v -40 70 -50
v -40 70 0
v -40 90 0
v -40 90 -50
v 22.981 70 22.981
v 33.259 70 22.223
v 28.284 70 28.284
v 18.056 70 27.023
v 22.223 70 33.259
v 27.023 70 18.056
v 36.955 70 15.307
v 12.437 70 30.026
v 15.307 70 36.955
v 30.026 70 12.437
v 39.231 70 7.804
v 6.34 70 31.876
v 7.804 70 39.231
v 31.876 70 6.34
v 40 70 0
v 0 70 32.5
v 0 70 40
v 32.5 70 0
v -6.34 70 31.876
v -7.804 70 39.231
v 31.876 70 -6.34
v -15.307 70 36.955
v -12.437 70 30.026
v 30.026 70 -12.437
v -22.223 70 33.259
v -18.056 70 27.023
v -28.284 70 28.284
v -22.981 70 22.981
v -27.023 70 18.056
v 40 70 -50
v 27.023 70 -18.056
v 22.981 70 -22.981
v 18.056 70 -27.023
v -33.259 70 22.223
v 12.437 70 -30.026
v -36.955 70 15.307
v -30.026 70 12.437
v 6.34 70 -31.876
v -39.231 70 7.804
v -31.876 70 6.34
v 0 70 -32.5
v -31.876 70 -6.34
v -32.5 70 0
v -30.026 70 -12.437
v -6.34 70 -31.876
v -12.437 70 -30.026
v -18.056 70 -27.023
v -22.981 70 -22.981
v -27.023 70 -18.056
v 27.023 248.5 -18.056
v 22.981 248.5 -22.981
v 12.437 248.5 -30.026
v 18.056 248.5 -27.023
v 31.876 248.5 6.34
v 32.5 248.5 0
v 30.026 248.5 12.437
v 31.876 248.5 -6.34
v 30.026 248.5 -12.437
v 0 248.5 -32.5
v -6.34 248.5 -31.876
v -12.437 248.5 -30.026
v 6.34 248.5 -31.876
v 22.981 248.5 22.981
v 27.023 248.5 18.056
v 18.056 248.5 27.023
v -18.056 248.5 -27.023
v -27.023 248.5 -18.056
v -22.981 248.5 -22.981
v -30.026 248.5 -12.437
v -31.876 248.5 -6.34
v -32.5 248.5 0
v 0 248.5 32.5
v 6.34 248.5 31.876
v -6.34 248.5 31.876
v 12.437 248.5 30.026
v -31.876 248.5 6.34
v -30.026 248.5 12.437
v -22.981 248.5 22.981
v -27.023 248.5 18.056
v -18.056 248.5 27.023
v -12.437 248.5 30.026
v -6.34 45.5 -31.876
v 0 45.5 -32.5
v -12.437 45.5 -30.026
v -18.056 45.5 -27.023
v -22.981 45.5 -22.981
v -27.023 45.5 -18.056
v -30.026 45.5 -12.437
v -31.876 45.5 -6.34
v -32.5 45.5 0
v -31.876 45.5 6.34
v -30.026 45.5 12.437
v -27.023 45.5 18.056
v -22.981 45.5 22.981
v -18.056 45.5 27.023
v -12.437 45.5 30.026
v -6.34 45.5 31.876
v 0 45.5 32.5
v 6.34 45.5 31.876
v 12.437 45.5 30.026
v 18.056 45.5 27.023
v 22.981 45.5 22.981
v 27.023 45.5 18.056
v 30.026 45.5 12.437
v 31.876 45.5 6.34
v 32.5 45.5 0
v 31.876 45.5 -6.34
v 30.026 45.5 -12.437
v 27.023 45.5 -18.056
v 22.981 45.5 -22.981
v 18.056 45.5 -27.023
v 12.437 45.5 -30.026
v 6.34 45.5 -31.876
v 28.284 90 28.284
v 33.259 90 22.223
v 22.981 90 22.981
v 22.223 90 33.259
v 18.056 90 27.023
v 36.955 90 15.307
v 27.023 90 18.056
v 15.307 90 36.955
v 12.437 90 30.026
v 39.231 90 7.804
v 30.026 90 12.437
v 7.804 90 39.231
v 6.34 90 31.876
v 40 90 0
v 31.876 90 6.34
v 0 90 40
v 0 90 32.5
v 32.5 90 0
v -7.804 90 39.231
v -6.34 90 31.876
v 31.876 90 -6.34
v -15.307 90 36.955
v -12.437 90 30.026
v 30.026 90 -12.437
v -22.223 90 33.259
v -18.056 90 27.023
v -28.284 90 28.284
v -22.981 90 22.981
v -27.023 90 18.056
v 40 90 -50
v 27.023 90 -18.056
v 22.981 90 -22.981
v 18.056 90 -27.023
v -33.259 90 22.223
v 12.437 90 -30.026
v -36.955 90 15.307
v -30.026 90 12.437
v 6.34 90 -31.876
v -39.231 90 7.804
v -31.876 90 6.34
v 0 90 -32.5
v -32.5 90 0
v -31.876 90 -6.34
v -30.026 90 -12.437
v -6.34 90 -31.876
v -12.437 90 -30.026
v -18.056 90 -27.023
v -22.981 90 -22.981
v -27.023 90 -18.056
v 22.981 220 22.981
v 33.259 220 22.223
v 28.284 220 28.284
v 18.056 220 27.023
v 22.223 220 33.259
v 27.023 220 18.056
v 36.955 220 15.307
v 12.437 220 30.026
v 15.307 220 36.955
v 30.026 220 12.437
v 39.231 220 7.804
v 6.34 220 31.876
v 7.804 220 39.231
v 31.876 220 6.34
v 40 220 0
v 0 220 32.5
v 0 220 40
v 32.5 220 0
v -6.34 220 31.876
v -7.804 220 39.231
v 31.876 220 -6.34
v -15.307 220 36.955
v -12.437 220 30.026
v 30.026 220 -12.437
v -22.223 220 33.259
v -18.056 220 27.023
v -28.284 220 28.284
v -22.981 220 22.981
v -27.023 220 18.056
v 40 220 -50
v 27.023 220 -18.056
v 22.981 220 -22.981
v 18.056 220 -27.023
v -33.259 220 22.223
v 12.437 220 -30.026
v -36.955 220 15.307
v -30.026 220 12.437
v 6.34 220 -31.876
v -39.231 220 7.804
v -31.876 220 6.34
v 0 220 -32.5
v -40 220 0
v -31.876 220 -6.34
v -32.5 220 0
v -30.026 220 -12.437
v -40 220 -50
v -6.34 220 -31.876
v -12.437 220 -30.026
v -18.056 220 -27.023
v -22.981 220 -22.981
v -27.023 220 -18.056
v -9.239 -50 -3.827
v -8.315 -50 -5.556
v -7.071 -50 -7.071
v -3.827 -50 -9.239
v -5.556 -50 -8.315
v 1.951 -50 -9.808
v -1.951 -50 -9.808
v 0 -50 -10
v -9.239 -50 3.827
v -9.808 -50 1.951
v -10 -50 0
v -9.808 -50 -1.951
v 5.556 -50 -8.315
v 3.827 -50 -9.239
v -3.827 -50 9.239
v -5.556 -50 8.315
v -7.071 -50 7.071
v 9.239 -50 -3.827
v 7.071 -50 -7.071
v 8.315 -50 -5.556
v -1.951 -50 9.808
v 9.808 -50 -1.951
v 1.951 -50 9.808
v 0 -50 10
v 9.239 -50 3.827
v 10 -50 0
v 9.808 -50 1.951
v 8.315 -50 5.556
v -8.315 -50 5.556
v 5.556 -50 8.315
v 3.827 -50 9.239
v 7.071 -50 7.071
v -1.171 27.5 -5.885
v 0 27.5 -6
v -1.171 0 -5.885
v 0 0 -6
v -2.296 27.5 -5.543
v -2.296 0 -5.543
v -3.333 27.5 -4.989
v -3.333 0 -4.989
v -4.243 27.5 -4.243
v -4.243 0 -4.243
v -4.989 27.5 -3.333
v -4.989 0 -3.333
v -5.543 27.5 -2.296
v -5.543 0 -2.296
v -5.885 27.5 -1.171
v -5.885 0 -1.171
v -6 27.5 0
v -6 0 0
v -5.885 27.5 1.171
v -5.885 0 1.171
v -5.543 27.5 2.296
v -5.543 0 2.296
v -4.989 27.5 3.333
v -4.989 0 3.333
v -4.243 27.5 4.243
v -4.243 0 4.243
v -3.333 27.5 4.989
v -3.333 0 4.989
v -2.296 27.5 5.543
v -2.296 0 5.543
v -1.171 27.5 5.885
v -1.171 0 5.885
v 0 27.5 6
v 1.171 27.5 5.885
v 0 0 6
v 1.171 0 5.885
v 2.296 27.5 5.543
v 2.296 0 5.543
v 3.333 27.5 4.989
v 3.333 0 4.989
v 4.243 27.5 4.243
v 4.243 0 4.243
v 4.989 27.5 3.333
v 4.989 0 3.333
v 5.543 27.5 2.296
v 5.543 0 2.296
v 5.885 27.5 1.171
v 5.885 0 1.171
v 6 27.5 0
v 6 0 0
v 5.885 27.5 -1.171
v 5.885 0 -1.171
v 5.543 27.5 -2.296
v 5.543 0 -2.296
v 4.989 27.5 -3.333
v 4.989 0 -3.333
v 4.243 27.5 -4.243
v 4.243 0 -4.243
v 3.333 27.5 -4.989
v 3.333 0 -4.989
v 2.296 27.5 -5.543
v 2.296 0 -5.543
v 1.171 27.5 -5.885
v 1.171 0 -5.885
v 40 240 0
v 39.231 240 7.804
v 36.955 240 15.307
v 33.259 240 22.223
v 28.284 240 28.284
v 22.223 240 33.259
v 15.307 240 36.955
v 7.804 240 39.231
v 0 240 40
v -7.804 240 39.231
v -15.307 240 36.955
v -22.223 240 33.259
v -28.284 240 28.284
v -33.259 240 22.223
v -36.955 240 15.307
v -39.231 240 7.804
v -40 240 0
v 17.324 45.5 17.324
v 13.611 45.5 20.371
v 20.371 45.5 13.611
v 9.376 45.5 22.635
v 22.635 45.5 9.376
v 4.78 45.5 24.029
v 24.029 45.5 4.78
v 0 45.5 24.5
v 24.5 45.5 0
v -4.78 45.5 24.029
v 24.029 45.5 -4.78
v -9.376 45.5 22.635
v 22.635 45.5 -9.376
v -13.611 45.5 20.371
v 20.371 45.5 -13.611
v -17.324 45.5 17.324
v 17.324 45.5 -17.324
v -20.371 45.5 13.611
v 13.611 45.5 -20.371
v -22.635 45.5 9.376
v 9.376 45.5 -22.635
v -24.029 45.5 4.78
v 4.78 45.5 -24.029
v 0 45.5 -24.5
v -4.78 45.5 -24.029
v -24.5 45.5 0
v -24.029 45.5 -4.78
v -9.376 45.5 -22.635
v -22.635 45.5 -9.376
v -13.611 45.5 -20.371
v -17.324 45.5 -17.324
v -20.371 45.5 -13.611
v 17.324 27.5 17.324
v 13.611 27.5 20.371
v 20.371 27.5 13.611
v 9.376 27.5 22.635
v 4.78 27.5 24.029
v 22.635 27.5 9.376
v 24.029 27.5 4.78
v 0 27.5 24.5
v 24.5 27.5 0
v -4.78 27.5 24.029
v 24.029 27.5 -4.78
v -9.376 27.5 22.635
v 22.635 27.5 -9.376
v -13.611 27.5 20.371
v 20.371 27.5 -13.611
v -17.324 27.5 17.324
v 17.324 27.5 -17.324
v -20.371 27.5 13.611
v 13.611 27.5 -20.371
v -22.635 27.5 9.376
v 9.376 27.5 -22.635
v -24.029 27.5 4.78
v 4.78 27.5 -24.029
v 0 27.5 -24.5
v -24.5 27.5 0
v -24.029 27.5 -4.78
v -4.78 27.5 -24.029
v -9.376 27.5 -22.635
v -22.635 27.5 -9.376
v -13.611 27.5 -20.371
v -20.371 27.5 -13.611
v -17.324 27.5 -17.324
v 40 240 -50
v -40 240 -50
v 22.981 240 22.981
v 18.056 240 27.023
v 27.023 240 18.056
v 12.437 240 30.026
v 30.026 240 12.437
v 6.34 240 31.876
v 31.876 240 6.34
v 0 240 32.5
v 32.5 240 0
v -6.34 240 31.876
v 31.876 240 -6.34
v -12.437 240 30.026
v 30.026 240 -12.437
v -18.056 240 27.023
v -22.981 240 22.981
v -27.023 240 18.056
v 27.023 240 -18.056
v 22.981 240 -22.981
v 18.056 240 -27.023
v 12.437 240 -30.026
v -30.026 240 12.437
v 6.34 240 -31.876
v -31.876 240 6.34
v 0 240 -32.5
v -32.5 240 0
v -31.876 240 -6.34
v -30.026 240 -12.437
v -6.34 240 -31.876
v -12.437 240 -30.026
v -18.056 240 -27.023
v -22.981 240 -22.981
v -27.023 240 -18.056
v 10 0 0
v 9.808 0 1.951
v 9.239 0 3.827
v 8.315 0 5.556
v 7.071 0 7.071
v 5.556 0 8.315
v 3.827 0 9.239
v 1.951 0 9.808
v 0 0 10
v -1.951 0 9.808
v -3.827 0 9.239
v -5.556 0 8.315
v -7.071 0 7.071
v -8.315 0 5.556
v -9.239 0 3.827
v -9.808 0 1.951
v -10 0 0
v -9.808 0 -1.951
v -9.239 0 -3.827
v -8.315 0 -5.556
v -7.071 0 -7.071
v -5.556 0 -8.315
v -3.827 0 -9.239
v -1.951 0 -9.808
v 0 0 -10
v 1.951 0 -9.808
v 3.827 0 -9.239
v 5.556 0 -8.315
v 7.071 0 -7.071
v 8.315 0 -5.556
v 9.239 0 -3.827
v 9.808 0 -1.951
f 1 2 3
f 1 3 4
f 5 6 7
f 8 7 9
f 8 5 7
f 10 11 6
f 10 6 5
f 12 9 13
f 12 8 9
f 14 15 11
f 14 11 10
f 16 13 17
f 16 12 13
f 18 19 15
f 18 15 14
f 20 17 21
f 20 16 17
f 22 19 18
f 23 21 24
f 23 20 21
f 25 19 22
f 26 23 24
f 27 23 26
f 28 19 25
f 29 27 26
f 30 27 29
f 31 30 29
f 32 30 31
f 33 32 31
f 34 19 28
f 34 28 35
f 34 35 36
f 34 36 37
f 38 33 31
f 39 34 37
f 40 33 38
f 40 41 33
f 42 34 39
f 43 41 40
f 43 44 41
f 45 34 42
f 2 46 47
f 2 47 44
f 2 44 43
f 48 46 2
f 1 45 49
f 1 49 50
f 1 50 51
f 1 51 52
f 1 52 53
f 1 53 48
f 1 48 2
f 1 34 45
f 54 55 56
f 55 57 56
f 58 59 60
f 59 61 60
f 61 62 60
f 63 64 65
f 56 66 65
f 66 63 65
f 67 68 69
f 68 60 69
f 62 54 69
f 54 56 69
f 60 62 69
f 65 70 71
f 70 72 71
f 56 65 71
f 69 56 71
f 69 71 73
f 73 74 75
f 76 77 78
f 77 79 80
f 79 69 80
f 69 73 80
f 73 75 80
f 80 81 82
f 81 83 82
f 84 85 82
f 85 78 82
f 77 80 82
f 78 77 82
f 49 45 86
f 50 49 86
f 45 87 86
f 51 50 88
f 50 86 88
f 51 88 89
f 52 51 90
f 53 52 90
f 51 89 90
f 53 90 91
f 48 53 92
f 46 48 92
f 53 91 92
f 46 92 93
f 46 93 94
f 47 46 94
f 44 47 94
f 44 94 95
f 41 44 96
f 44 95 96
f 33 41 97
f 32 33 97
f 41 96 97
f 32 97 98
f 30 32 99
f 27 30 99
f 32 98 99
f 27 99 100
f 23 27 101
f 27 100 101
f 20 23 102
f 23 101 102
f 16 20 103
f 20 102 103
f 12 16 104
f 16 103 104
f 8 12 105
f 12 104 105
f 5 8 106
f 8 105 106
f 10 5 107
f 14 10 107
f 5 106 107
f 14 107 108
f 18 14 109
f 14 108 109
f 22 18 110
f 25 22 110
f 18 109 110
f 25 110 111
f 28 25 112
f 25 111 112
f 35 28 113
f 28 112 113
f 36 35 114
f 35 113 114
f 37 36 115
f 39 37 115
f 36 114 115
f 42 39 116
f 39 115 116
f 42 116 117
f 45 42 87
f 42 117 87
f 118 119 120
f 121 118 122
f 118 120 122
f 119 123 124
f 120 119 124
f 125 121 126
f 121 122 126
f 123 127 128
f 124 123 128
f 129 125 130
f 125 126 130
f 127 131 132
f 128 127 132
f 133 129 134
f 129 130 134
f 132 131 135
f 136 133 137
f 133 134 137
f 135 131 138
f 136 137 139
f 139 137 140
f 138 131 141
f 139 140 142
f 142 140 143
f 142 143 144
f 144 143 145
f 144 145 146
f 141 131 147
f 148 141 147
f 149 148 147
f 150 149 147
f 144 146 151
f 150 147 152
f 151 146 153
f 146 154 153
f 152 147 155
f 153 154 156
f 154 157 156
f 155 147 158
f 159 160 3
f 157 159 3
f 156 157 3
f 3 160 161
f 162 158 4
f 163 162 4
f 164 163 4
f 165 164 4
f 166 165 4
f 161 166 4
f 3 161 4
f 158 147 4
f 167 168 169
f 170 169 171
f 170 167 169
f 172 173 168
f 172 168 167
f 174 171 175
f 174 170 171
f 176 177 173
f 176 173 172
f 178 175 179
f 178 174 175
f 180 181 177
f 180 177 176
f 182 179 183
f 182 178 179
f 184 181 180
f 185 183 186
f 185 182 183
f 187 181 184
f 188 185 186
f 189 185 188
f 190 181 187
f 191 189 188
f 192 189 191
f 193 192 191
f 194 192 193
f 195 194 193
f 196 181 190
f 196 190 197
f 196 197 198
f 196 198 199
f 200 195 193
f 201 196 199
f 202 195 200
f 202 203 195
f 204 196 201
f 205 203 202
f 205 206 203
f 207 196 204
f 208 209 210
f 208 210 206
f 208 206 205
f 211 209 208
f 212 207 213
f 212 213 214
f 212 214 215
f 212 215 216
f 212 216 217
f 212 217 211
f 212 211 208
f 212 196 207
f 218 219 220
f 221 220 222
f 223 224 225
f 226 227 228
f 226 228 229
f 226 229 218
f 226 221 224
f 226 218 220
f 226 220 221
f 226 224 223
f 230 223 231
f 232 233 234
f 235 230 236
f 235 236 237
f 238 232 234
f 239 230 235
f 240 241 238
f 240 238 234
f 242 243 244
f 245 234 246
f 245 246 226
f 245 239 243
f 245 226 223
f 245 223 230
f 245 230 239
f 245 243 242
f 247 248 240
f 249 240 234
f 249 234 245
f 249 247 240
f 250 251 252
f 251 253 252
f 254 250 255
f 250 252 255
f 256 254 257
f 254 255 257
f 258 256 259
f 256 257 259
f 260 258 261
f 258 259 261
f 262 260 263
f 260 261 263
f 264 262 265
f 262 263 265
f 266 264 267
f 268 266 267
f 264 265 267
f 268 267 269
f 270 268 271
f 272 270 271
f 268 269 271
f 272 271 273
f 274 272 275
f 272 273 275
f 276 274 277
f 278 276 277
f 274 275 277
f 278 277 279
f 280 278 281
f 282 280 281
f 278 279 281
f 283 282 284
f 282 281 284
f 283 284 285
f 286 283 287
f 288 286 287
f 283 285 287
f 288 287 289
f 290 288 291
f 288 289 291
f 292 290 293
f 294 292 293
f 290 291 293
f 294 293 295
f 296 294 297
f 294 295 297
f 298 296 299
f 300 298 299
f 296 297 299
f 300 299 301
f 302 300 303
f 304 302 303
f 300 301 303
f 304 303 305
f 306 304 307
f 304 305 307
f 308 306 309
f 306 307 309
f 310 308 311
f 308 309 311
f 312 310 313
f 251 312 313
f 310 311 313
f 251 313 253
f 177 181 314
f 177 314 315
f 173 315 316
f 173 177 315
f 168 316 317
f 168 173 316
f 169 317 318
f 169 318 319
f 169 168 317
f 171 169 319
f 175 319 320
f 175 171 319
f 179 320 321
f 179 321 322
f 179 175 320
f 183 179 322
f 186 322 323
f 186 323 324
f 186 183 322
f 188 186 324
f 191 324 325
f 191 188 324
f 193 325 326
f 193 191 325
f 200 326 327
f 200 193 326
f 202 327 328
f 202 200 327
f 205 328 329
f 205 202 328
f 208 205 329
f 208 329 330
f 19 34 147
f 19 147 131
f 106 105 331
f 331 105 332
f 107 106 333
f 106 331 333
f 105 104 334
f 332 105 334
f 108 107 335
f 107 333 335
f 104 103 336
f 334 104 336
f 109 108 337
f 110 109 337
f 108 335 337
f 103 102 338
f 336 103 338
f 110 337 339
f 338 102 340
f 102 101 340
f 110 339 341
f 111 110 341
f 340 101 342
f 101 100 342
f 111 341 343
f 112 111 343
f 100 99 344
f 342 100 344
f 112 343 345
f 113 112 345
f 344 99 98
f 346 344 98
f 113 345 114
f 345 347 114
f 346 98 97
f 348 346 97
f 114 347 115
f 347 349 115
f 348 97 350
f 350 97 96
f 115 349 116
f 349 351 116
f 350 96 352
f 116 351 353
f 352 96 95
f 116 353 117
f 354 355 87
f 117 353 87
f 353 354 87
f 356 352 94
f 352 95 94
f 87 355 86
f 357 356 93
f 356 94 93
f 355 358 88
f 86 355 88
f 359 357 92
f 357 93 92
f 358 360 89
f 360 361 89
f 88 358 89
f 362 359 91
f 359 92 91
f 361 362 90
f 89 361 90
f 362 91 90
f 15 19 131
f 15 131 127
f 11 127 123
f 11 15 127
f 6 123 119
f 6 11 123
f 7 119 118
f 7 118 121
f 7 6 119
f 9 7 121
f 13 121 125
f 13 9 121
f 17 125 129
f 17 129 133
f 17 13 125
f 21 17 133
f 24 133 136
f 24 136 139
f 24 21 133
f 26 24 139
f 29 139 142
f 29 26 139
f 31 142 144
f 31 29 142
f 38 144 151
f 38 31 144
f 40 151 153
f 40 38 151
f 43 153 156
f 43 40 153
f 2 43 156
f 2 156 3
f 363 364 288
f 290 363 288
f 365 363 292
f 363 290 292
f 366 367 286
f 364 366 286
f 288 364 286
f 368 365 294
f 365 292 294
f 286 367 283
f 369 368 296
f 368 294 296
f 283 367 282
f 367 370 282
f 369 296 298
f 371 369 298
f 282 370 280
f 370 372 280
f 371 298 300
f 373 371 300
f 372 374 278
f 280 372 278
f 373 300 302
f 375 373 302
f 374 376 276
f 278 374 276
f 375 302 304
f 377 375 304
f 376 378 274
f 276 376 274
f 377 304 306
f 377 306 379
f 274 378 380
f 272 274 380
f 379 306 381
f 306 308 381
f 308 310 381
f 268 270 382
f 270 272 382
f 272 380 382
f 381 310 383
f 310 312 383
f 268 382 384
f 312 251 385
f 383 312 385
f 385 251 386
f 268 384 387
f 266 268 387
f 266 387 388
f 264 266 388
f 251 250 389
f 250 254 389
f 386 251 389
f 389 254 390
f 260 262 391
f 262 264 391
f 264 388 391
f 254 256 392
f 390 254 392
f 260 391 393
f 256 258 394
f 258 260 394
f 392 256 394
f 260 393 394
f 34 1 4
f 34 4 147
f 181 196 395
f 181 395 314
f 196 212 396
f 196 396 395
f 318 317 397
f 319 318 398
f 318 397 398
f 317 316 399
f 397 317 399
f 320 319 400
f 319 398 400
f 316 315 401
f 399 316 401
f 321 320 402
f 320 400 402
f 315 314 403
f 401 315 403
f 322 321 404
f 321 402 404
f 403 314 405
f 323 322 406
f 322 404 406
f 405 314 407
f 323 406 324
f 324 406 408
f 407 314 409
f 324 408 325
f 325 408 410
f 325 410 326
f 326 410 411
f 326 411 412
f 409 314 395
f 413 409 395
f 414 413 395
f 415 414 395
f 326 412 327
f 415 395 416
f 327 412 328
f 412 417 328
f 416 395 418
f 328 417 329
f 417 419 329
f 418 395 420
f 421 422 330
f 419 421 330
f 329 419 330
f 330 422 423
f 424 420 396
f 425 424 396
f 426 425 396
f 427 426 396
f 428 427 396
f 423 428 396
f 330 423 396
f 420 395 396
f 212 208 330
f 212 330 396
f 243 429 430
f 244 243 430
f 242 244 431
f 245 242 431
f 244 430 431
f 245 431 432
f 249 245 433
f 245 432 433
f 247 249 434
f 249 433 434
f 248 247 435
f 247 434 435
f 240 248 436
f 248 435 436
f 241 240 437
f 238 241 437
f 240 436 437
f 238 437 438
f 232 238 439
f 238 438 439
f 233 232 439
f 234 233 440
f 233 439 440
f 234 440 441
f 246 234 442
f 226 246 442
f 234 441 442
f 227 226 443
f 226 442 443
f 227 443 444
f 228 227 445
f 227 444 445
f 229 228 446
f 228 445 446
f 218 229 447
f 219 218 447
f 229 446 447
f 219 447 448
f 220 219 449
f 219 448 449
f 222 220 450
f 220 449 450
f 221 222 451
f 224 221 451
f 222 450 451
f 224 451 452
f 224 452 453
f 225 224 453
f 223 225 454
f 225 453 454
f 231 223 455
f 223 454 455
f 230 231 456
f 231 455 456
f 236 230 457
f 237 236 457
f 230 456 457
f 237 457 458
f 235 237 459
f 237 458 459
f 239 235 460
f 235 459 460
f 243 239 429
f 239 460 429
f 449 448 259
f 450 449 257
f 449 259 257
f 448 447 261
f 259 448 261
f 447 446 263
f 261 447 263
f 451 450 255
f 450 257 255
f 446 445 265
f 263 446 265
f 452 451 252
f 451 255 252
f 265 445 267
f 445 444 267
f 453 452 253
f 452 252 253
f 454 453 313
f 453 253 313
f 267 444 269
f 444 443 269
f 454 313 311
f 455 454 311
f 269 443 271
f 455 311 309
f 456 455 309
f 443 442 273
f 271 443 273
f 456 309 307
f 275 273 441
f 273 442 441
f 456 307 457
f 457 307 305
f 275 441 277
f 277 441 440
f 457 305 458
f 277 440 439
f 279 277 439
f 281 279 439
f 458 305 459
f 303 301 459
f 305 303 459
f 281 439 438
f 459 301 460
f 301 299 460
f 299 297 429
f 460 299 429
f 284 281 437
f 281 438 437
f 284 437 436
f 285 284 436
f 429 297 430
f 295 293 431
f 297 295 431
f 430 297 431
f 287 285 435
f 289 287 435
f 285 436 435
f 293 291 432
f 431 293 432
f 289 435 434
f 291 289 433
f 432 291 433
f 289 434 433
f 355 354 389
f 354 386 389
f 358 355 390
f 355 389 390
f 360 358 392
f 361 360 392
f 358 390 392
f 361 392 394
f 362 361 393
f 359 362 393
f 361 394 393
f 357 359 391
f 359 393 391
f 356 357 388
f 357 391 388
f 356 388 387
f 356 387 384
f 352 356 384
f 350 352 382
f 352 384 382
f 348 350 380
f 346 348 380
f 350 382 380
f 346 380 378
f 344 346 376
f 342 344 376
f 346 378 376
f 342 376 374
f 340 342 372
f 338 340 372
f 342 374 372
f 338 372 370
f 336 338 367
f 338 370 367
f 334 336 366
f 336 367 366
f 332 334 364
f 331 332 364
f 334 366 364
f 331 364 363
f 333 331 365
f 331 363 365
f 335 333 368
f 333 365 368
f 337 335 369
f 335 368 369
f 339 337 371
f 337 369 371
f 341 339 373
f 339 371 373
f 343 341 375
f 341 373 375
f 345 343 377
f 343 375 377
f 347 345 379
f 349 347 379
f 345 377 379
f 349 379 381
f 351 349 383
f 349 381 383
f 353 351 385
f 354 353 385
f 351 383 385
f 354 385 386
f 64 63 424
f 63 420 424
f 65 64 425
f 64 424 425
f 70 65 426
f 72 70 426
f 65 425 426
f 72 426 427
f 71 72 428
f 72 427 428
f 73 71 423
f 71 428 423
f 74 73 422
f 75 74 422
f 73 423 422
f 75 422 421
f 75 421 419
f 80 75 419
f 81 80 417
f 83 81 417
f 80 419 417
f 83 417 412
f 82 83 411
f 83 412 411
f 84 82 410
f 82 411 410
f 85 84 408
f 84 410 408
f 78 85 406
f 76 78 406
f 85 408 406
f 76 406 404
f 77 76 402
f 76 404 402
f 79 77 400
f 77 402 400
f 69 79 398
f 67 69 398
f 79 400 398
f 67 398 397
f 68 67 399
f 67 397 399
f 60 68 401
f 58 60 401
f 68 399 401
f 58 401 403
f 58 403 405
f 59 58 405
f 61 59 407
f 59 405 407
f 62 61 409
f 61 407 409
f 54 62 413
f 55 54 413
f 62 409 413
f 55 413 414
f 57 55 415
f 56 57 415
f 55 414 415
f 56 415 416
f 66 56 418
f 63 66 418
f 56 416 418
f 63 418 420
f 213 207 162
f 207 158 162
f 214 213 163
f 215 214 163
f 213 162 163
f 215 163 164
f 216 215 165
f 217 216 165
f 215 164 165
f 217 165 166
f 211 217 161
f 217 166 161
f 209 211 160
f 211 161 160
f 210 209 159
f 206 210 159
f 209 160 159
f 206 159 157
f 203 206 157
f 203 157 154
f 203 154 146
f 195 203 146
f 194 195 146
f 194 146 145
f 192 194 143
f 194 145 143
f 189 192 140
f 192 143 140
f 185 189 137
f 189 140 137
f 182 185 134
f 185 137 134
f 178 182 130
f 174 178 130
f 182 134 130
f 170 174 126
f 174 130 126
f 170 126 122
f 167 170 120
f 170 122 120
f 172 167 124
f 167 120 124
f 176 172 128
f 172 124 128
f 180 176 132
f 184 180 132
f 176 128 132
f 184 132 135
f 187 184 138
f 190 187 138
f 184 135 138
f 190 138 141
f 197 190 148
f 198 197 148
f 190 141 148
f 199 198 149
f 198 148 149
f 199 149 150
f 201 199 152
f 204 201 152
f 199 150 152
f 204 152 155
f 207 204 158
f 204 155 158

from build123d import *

# Parameters (mm, degrees)
BOSS_EXTRUDE1_START = 70
SKETCH2_R           = 32.5
BOSS_EXTRUDE1_DEPTH = 20
LPATTERN1_COUNT     = 2
LPATTERN1_PITCH     = 150
SKETCH4_R           = 10
BOSS_EXTRUDE2_DEPTH = 50


with BuildPart() as part:
    # Sketch1 → Revolve1 (revolve)
    with BuildSketch(Plane.XY, mode=Mode.PRIVATE) as revolve1_sk:
        Polygon((0, 248.5), (-32.5, 248.5), (-32.5, 45.5), (-24.5, 45.5), (-24.5, 27.5), (-6, 27.5), (-6, 0), (0, 0), align=None)
    revolve(revolve1_sk.sketch.rotate(Axis((0, 0, 0), (0, 1, 0)), 270), axis=Axis((0, 0, 0), (0, 1, 0)))

    # Sketch2 → Boss-Extrude1 (add)
    with BuildSketch(Plane(origin=(0, 0, 0), x_dir=(1, 0, 0), z_dir=(0, 1, 0)).offset(BOSS_EXTRUDE1_START)):
        with BuildLine():
            Line((-40, 0), (-40, 50))
            Line((-40, 50), (40, 50))
            Line((40, 50), (40, 0))
            ThreePointArc((40, 0), (0, -40), (-40, 0))
        make_face()
        with Locations(Location((0, 0, 0), (0, 0, 90))):
            Circle(SKETCH2_R, mode=Mode.SUBTRACT)
    boss_extrude1 = extrude(amount=BOSS_EXTRUDE1_DEPTH)

    # LPattern1: Boss-Extrude1 ×2
    with Locations(*[(0, i * LPATTERN1_PITCH, 0) for i in range(1, LPATTERN1_COUNT)]):
        add(boss_extrude1)

    # Sketch4 → Boss-Extrude2 (add)
    with BuildSketch(Plane.XZ):
        Circle(SKETCH4_R)
    extrude(amount=BOSS_EXTRUDE2_DEPTH)


solid = part.part
